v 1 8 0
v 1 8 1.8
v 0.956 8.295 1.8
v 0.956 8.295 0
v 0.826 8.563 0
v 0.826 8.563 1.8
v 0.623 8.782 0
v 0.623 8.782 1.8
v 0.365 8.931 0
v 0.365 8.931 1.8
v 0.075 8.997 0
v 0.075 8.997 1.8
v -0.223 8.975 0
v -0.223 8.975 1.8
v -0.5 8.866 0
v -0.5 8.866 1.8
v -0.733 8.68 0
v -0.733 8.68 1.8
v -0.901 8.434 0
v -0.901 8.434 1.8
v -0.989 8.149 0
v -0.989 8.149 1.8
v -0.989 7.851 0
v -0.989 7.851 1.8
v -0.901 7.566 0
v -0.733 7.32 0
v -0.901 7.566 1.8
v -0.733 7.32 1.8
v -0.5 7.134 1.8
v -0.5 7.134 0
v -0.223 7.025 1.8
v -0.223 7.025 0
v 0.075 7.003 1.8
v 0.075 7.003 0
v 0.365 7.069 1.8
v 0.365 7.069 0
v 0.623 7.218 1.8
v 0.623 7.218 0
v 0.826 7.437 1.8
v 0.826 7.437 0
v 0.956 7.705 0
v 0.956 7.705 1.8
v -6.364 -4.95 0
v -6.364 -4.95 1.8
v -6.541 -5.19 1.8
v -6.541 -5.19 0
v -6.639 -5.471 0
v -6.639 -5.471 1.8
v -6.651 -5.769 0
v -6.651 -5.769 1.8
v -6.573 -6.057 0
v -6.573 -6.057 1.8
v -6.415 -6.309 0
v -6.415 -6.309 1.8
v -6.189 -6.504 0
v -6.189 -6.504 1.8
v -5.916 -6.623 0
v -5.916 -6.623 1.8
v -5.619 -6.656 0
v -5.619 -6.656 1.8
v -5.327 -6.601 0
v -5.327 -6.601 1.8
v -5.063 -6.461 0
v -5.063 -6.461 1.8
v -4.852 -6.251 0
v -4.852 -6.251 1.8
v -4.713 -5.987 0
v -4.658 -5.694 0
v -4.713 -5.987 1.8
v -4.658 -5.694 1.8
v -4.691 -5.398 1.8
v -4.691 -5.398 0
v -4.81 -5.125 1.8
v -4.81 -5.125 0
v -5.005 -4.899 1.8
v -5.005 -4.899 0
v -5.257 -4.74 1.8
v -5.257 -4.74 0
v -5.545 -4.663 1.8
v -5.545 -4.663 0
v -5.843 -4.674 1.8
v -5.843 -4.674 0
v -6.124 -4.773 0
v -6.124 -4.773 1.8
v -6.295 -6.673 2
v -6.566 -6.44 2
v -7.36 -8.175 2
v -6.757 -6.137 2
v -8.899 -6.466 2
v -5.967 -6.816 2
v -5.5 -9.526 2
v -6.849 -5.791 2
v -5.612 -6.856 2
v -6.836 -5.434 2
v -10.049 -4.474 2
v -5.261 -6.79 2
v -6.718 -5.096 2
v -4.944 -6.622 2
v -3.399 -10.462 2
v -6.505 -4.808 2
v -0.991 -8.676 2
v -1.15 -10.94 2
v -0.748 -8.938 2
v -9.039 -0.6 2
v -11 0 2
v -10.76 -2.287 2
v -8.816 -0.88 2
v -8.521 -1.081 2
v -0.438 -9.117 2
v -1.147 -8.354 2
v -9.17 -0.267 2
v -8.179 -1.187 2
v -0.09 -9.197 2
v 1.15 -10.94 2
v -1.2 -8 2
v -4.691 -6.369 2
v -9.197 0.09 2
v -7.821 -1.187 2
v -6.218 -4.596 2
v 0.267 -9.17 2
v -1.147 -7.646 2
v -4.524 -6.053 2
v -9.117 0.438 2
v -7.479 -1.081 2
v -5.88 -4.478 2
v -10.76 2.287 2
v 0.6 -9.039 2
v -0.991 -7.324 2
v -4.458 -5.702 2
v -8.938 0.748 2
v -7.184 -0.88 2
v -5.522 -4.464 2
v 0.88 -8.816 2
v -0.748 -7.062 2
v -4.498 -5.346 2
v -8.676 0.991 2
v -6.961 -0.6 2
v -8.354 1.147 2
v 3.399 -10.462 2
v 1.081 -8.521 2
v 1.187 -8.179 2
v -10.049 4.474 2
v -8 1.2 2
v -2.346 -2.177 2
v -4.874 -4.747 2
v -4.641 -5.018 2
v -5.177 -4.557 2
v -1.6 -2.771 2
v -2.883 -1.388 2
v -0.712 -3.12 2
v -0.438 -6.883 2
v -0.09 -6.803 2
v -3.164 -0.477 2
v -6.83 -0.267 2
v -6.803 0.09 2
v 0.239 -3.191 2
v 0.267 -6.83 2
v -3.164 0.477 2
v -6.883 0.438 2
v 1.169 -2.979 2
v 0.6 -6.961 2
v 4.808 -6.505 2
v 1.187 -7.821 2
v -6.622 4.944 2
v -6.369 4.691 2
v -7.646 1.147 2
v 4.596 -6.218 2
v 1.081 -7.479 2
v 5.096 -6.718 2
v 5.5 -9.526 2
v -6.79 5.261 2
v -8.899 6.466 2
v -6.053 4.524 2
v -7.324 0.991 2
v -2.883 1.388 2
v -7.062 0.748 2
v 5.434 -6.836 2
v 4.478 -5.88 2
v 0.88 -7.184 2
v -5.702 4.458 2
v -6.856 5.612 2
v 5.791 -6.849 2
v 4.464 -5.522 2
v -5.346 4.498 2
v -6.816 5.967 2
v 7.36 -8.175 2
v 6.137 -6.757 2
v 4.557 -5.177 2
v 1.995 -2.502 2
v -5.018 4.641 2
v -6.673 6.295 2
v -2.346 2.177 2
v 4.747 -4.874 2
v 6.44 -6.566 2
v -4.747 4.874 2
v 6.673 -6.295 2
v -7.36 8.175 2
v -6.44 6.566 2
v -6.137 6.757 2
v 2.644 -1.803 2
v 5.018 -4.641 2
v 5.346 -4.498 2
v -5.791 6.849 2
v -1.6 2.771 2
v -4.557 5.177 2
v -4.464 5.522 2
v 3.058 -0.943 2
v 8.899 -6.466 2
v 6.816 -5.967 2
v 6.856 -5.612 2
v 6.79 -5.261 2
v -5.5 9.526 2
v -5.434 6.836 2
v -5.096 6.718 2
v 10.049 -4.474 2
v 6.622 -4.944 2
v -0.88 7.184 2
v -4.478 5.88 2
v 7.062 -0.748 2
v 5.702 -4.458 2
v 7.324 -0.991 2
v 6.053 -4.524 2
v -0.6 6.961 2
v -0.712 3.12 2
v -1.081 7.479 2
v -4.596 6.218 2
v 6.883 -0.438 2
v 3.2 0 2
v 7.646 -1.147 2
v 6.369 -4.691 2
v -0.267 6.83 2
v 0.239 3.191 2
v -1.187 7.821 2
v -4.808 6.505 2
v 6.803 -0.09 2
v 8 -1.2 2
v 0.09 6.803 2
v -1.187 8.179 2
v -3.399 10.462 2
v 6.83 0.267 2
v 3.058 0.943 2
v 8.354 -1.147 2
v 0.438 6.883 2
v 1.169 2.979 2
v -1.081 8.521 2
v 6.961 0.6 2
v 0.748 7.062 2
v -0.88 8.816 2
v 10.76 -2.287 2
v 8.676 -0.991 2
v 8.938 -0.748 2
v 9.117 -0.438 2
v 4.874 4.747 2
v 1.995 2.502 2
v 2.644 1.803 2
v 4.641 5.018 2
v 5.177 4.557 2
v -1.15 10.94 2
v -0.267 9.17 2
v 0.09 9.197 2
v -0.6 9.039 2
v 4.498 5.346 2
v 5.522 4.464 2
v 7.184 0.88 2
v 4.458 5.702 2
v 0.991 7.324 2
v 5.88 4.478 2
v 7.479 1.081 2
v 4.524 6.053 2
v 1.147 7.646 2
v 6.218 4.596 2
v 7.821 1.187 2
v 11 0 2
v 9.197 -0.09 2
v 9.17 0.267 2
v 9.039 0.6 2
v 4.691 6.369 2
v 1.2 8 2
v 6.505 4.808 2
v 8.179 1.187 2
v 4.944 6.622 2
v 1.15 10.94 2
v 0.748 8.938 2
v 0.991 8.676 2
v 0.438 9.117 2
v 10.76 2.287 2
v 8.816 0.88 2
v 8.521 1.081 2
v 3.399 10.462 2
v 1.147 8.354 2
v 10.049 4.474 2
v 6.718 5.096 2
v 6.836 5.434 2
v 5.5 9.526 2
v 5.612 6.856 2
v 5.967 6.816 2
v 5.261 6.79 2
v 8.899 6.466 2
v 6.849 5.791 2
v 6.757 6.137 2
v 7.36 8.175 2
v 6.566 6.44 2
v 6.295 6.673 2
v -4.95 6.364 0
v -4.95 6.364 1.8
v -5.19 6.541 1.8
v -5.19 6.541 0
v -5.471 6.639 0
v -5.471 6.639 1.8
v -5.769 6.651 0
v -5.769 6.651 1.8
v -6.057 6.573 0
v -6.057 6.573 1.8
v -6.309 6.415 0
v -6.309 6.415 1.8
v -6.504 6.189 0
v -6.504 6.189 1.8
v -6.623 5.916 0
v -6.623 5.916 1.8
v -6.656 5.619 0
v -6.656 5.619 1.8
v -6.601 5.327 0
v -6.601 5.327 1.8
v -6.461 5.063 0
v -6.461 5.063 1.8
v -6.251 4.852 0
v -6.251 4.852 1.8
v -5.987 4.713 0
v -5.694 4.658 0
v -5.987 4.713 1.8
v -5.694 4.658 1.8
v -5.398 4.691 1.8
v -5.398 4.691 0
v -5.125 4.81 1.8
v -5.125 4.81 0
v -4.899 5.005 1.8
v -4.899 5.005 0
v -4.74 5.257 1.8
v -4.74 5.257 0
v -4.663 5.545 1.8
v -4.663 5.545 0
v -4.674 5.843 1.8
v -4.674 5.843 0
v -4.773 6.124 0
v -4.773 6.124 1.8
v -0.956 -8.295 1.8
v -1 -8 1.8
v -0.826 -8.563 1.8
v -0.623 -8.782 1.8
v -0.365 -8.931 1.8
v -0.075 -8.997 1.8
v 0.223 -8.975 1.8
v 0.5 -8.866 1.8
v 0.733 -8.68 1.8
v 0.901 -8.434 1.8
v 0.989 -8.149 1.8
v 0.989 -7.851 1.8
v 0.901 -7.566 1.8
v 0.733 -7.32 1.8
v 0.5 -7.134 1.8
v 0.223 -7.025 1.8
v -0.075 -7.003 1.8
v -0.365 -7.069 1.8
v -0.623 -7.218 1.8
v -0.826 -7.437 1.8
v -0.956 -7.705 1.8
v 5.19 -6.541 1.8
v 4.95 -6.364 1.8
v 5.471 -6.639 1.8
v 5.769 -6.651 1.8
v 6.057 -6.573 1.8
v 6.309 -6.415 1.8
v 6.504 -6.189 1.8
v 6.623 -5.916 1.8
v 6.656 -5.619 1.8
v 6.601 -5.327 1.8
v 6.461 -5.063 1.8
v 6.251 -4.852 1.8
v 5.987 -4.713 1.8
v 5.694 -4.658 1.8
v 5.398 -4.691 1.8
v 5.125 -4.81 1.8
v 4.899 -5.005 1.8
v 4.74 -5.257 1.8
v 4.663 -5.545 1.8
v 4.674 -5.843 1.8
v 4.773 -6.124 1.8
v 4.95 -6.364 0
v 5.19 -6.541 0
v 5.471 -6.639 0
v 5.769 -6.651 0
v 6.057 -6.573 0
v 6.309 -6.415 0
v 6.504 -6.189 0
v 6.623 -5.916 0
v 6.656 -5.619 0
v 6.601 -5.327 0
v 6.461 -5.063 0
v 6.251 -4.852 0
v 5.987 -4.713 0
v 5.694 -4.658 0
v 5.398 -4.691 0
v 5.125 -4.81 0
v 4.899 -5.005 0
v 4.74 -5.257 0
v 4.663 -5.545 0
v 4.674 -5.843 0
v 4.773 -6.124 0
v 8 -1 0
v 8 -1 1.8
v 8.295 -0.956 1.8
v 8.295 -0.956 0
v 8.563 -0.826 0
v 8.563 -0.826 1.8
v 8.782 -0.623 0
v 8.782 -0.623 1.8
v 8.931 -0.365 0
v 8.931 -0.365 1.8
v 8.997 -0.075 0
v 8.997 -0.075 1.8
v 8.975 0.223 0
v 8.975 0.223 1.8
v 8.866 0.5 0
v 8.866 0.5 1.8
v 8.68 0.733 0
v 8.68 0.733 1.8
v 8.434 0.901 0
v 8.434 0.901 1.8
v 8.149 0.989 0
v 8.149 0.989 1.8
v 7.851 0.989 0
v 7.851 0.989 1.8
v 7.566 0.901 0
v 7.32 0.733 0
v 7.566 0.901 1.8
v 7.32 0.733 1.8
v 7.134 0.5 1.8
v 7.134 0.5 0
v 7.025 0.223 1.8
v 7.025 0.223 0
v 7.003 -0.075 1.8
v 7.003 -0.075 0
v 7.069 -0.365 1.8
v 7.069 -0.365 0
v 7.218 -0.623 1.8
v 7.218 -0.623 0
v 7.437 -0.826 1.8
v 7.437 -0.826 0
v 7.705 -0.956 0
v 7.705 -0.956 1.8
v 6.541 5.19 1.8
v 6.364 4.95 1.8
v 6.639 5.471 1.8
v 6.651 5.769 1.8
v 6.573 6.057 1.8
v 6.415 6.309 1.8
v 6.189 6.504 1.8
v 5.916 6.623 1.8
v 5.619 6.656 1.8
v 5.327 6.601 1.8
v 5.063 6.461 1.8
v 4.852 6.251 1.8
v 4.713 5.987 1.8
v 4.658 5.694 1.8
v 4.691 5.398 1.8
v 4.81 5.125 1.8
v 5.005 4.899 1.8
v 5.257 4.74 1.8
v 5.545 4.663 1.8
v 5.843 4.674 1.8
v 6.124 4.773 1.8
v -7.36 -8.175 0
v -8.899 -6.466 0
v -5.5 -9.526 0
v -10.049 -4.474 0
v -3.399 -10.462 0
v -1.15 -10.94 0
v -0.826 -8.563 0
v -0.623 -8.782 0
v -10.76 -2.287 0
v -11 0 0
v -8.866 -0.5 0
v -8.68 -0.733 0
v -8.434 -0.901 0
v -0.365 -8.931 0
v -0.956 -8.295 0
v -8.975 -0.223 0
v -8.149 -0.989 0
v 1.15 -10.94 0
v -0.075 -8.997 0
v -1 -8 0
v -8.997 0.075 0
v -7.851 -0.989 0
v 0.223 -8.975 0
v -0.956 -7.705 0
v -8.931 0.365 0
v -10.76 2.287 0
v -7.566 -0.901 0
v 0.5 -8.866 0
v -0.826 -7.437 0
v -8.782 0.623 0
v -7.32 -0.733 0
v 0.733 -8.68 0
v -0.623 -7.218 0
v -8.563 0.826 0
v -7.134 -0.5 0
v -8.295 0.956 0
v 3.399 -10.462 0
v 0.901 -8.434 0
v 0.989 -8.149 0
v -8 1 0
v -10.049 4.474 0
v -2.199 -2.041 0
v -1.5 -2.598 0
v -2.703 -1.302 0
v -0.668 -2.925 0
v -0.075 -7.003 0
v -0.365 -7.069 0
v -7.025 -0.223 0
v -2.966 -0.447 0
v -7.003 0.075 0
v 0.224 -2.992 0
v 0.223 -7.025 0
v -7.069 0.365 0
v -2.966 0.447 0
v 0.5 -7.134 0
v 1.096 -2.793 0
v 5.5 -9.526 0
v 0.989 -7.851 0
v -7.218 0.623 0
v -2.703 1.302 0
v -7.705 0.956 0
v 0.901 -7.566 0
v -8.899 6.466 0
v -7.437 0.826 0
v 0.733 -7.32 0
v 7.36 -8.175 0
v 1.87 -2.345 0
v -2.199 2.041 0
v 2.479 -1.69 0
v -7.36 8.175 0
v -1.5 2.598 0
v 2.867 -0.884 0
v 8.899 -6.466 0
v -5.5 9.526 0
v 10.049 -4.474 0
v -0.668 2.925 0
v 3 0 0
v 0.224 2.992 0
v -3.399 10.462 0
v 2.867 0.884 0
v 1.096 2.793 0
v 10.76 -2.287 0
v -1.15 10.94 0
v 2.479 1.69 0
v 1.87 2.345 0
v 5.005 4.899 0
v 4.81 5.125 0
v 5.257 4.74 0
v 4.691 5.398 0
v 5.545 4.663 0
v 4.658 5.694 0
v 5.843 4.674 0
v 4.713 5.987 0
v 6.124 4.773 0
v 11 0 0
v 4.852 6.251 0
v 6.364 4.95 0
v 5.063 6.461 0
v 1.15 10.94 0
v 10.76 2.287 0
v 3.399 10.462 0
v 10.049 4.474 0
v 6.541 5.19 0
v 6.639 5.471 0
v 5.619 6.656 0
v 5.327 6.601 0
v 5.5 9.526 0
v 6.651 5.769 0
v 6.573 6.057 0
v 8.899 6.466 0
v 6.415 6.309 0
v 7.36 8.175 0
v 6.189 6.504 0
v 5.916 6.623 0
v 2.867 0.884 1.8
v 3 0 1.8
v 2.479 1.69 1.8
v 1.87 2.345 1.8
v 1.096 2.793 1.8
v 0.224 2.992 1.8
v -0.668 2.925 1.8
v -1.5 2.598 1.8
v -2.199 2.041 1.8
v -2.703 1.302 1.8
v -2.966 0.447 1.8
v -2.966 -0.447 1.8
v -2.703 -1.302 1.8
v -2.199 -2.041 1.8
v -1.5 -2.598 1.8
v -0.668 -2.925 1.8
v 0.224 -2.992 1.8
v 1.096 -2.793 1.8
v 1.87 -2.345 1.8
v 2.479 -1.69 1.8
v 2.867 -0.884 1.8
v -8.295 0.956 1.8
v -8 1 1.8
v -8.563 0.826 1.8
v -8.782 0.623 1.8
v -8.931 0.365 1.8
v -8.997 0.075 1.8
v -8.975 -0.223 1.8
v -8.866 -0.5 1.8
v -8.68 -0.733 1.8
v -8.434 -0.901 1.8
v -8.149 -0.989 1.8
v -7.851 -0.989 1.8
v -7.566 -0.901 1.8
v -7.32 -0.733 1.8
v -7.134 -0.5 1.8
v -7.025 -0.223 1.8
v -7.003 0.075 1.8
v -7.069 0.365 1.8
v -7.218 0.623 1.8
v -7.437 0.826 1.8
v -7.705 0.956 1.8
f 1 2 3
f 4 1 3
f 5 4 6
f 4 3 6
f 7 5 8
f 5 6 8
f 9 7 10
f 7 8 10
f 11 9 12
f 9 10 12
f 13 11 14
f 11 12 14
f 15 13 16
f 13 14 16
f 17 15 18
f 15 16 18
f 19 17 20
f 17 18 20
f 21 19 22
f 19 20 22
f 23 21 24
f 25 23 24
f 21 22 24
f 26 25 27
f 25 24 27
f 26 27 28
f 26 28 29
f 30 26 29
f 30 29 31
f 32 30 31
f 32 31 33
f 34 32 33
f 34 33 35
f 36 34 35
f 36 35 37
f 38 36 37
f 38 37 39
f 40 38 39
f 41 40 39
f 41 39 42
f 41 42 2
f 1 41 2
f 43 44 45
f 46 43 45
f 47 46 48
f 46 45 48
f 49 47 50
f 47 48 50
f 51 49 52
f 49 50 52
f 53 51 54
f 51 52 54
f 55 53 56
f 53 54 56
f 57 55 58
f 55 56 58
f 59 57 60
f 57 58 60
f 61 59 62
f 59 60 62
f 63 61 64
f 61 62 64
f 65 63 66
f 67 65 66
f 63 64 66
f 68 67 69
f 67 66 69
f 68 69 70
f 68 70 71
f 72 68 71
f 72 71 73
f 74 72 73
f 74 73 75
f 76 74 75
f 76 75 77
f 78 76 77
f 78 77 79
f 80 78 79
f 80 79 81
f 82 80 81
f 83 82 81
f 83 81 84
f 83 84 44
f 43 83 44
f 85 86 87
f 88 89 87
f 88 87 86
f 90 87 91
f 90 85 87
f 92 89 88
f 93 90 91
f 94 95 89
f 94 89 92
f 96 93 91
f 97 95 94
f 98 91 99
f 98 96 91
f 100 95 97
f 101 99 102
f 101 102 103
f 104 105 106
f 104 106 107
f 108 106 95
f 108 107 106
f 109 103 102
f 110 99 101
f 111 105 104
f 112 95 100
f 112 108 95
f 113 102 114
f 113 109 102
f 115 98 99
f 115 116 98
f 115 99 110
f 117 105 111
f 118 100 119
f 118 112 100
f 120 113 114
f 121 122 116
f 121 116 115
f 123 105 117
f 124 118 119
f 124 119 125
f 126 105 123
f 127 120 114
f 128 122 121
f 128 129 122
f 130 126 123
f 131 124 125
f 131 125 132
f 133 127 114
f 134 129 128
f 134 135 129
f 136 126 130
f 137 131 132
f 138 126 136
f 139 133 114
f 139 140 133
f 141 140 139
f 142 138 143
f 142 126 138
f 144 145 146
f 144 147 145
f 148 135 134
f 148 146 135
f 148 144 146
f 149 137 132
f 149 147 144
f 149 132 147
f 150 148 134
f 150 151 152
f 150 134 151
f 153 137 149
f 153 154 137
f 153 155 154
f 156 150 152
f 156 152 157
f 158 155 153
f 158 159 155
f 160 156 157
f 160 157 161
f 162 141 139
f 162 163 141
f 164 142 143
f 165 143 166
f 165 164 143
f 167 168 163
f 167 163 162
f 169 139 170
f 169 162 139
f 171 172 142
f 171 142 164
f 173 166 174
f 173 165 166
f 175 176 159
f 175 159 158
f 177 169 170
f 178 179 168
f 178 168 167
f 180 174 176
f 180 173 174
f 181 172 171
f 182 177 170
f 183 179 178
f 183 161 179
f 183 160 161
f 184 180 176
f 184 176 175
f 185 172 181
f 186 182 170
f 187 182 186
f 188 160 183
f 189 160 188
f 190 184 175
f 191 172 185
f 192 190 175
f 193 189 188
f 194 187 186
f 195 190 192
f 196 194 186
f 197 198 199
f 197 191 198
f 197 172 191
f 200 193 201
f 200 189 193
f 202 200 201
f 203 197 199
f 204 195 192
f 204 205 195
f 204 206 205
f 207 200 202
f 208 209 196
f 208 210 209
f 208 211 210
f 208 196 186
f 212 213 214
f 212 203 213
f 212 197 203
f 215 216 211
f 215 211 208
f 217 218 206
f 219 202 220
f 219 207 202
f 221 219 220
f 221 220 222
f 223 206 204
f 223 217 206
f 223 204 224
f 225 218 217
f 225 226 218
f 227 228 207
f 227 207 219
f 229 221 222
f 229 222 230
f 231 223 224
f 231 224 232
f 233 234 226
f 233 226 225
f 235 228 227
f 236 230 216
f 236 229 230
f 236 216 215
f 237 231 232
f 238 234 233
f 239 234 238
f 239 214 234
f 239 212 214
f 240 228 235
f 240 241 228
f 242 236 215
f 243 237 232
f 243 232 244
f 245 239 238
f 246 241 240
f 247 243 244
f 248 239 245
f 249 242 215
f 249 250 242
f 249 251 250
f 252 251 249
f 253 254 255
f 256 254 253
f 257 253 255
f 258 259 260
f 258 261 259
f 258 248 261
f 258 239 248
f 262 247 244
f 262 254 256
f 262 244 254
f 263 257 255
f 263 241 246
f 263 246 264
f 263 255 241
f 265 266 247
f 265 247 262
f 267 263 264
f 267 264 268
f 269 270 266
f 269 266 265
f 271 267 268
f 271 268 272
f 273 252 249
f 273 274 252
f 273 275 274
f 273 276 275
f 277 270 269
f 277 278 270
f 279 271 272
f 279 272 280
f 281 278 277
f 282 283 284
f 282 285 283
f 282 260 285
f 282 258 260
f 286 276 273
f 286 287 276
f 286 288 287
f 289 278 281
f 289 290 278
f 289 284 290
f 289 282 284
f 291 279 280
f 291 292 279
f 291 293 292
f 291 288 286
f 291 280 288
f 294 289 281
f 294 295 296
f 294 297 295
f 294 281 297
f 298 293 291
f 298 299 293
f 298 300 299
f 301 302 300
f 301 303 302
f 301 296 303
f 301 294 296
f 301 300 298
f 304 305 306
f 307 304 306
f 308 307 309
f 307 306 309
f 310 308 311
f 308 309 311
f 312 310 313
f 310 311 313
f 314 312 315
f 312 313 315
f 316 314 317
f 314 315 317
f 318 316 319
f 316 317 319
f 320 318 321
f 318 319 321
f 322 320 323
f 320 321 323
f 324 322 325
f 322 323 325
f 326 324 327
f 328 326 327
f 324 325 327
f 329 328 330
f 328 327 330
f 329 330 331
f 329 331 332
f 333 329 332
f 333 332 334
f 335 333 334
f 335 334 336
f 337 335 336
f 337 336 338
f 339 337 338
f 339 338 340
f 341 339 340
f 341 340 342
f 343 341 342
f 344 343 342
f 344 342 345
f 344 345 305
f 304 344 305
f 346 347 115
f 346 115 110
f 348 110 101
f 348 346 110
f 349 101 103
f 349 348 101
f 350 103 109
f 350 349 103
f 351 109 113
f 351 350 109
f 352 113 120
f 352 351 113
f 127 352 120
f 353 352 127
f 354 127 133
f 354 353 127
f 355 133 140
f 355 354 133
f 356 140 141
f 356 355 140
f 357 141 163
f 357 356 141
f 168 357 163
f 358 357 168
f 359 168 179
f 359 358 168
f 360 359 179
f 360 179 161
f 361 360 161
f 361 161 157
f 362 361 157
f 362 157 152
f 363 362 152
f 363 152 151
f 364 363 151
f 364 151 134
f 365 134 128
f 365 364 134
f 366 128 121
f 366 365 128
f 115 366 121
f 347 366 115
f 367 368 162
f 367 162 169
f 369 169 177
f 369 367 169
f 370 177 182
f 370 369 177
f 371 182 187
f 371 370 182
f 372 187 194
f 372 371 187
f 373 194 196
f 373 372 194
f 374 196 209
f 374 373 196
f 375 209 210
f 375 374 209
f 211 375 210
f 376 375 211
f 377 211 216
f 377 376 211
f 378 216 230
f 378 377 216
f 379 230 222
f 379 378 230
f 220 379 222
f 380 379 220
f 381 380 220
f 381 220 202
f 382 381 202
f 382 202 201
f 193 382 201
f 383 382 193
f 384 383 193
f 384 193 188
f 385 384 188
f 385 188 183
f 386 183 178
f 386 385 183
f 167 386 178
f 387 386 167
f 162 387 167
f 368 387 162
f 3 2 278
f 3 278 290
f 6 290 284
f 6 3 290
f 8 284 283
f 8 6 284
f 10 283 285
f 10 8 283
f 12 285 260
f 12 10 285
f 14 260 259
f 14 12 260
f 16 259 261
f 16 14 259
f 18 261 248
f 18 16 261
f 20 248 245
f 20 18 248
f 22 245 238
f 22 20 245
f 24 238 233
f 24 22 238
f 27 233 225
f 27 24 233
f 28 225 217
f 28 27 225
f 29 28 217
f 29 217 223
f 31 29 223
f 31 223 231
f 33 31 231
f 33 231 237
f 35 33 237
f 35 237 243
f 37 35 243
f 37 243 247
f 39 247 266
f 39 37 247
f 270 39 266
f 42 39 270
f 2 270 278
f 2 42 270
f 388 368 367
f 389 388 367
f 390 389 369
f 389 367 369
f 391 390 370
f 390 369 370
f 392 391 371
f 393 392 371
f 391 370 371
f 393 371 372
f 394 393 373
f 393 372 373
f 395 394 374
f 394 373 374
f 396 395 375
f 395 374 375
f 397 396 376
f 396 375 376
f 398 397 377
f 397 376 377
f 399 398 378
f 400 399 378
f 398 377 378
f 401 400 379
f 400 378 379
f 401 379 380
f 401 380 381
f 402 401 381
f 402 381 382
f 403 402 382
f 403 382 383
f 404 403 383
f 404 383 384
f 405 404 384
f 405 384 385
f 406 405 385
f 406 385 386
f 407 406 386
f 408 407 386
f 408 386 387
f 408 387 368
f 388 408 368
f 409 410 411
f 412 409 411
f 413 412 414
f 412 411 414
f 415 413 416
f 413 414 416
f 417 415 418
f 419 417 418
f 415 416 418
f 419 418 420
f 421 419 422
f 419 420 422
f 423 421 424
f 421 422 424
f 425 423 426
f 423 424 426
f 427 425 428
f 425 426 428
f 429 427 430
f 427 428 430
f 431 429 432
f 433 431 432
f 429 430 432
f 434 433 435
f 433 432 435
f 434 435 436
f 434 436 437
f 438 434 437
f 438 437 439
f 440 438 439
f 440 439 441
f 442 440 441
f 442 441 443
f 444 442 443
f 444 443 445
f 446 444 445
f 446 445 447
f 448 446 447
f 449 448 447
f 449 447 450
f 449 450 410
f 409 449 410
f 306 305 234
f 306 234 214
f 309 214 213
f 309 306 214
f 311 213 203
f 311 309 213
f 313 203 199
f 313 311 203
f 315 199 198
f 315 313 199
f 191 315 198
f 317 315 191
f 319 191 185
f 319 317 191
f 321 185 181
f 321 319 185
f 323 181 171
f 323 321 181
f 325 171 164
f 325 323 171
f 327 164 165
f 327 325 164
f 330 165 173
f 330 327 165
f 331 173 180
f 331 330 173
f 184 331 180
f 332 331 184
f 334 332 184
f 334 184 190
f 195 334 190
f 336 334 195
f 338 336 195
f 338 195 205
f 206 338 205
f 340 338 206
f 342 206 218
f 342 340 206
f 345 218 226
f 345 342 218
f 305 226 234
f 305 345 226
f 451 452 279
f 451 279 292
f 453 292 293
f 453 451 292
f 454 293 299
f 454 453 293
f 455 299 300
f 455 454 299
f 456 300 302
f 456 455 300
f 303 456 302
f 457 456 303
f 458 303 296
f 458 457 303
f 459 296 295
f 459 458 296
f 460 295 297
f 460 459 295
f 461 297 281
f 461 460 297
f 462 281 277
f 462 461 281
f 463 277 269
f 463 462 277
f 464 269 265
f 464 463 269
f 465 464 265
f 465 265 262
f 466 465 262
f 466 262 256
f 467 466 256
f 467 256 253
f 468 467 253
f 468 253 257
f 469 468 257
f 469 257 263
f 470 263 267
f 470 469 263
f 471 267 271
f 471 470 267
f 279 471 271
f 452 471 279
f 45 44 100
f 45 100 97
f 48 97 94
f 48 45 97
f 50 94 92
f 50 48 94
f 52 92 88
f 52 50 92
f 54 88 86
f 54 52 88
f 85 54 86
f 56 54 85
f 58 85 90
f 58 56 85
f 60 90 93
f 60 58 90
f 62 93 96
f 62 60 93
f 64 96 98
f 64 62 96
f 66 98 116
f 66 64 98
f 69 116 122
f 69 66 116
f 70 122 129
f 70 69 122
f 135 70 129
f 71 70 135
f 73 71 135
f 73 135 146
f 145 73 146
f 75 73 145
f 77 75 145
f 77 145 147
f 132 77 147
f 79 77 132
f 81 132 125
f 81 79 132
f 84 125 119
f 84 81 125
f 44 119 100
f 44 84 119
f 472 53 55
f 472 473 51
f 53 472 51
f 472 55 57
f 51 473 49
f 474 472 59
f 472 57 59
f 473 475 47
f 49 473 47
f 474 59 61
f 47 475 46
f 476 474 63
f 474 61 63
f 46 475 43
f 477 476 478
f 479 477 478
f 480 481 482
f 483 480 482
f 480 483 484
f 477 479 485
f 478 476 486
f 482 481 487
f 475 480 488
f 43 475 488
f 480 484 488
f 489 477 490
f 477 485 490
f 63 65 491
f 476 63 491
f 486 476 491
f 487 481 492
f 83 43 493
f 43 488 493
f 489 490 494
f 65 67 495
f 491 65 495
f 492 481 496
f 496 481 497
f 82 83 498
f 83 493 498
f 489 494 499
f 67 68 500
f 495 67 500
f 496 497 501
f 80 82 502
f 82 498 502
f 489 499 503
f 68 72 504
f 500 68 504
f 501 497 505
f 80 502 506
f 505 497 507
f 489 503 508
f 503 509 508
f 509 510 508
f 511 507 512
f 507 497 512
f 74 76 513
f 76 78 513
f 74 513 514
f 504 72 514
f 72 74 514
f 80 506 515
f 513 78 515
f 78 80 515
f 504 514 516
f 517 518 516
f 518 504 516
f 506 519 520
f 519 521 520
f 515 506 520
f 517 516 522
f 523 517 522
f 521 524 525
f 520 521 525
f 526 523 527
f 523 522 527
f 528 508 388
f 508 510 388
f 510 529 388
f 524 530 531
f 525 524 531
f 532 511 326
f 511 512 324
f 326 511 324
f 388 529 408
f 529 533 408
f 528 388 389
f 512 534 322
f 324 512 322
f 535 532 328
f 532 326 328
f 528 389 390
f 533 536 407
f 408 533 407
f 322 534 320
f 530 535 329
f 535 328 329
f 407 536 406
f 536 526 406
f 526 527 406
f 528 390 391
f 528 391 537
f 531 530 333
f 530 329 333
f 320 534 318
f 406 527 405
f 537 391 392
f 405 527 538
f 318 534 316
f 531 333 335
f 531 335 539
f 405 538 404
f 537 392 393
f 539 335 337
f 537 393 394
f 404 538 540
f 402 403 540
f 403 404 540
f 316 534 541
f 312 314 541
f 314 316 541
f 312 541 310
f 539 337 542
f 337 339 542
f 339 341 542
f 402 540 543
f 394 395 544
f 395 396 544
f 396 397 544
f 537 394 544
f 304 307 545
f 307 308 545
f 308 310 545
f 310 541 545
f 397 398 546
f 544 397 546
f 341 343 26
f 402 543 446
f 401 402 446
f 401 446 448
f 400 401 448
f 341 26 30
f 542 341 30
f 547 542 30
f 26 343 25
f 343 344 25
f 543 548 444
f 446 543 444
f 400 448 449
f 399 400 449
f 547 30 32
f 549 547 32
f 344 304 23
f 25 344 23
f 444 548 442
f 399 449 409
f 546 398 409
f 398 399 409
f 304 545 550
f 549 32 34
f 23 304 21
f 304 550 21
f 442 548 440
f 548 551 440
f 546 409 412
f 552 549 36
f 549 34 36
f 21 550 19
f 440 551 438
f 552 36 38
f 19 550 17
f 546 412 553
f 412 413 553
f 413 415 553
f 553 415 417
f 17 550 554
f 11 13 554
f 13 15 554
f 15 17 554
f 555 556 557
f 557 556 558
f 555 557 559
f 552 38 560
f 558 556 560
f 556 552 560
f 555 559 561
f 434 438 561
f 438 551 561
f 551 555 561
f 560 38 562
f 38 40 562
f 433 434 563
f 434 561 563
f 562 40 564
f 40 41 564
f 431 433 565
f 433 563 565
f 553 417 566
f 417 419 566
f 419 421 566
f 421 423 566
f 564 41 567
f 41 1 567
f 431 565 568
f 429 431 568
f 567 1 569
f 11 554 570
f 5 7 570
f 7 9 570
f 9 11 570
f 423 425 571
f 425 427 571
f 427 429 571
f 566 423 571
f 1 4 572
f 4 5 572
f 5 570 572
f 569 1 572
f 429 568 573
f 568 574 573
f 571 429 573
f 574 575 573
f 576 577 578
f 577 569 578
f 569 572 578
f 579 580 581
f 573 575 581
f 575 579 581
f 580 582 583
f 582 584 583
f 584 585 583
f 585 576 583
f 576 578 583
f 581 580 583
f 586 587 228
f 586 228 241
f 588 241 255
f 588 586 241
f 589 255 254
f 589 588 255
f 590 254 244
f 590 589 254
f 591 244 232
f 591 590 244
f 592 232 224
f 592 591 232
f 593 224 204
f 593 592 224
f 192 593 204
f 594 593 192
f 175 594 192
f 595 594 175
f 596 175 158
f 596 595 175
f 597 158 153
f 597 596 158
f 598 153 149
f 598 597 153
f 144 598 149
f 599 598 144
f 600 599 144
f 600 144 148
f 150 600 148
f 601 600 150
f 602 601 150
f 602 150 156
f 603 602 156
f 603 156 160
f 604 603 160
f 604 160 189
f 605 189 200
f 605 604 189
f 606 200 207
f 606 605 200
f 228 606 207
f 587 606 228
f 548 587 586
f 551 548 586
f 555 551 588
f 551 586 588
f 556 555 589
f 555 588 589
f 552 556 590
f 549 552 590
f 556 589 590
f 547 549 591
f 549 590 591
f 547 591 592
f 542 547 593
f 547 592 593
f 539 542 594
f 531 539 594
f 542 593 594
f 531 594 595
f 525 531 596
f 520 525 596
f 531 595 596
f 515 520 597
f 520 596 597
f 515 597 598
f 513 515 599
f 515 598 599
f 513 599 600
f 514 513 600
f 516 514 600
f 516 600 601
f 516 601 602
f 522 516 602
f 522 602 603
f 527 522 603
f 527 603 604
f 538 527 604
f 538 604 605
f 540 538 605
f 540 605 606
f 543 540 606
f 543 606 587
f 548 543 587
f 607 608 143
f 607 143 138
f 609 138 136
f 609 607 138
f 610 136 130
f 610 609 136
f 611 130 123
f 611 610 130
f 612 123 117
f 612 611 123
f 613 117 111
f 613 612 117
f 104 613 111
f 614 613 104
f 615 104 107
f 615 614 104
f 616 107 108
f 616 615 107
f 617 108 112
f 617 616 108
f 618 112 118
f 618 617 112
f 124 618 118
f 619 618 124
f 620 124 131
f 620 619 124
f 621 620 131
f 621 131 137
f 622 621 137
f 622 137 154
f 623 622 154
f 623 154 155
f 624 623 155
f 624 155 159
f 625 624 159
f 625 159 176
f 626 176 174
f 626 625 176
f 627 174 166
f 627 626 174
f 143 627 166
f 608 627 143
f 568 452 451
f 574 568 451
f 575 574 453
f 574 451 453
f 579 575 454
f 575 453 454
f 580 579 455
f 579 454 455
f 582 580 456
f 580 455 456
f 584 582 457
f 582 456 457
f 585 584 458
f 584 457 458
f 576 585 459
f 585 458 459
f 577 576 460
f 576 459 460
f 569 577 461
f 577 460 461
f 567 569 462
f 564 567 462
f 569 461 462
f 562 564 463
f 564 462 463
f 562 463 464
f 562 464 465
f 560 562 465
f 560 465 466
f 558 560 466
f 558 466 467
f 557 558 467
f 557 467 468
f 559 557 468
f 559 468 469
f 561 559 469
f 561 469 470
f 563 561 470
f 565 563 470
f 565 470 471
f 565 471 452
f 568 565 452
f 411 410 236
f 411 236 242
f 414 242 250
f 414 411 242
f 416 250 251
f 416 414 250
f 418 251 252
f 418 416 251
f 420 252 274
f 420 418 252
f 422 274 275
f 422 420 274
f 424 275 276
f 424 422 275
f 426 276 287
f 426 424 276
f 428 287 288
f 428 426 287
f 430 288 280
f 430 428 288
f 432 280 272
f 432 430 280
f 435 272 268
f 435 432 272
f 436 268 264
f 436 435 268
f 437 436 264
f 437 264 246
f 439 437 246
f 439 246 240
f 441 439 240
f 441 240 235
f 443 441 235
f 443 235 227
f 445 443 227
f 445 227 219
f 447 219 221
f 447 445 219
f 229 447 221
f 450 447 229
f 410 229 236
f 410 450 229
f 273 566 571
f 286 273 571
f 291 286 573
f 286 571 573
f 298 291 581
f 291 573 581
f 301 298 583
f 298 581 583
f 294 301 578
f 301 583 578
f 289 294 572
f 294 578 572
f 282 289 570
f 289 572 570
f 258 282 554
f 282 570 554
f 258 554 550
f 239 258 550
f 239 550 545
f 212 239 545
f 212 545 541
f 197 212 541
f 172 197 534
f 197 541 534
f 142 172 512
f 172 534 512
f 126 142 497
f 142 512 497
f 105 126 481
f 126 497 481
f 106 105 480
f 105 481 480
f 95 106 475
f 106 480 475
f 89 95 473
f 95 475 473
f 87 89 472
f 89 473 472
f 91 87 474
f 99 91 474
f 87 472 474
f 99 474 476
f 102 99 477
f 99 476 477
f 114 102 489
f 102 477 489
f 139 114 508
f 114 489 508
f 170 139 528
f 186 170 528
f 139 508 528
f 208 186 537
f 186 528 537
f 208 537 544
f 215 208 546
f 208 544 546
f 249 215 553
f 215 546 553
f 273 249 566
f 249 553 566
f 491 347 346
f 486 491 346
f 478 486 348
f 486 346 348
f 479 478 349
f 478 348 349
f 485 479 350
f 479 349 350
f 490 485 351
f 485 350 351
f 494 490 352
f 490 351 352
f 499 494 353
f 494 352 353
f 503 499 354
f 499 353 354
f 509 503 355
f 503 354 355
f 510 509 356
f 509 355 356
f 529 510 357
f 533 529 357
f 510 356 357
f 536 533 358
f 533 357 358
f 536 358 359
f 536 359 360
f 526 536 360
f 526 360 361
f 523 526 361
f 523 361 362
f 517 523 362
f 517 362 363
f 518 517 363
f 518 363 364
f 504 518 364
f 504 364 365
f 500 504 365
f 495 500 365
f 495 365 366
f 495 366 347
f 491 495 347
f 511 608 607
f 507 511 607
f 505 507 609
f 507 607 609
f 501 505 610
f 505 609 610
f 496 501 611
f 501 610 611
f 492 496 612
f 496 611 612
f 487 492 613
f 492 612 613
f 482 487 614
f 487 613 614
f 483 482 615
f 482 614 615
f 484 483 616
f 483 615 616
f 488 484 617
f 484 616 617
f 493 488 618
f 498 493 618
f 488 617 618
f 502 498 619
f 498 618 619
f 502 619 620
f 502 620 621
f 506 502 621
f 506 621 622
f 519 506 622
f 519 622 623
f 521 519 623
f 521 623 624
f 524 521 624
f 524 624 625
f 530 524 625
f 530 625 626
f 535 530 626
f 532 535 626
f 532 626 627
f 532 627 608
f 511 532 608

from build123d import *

# Parameters (mm, degrees)
SKETCH1_R           = 11
BOSS_EXTRUDE1_DEPTH = 2
SKETCH3_R           = 3
CUT_EXTRUDE1_DEPTH  = 16.684387141
SKETCH4_R           = 1
CUT_EXTRUDE2_DEPTH  = 16.684387141
CHAMFER1_SIZE       = 0.2
CHAMFER2_SIZE       = 0.2
CIRPATTERN1_COUNT   = 8
CHAMFER4_SIZE       = 0.2
CHAMFER5_SIZE       = 0.2
CHAMFER6_SIZE       = 0.2


with BuildPart() as part:
    # Sketch1 → Boss-Extrude1 (new body)
    with BuildSketch(Plane.XY):
        Circle(SKETCH1_R)
    extrude(amount=BOSS_EXTRUDE1_DEPTH)

    # Sketch3 → Cut-Extrude1 (cut, through all)
    with BuildSketch(Plane.XY.offset(2)):
        Circle(SKETCH3_R)
    extrude(amount=-CUT_EXTRUDE1_DEPTH, mode=Mode.SUBTRACT)

    # Sketch4 → Cut-Extrude2 (cut, through all)
    with BuildSketch(Plane.XY.offset(2)):
        with Locations((0, 8)):
            Circle(SKETCH4_R)
    cut_extrude2 = extrude(amount=-CUT_EXTRUDE2_DEPTH, mode=Mode.SUBTRACT)

    # Chamfer1
    chamfer1_edges = [part.edges().sort_by_distance(p)[0] for p in [
        (-1, 8, 2),
    ]]
    chamfer(chamfer1_edges, length=CHAMFER1_SIZE)

    # Chamfer2
    chamfer2_edges = [part.edges().sort_by_distance(p)[0] for p in [
        (-3, 0, 2),
    ]]
    chamfer(chamfer2_edges, length=CHAMFER2_SIZE)

    # CirPattern1: Cut-Extrude2 ×8 about axis
    cirpattern1_axis = Axis((0, 0, 0), (0, 0, 1))
    for i in range(1, CIRPATTERN1_COUNT):
        add(cut_extrude2.rotate(cirpattern1_axis, i * 360 / CIRPATTERN1_COUNT), mode=Mode.SUBTRACT)

    # Chamfer4
    chamfer4_edges = [part.edges().sort_by_distance(p)[0] for p in [
        (-4.949747468, -6.363961031, 2),
    ]]
    chamfer(chamfer4_edges, length=CHAMFER4_SIZE)

    # Chamfer5
    chamfer5_edges = [part.edges().sort_by_distance(p)[0] for p in [
        (8, 1, 2),
        (4.949747468, 6.363961031, 2),
    ]]
    chamfer(chamfer5_edges, length=CHAMFER5_SIZE)

    # Chamfer6
    chamfer6_edges = [part.edges().sort_by_distance(p)[0] for p in [
        (-6.363961031, 4.949747468, 2),
        (-8, -1, 2),
        (1, -8, 2),
        (6.363961031, -4.949747468, 2),
    ]]
    chamfer(chamfer6_edges, length=CHAMFER6_SIZE)


solid = part.part
